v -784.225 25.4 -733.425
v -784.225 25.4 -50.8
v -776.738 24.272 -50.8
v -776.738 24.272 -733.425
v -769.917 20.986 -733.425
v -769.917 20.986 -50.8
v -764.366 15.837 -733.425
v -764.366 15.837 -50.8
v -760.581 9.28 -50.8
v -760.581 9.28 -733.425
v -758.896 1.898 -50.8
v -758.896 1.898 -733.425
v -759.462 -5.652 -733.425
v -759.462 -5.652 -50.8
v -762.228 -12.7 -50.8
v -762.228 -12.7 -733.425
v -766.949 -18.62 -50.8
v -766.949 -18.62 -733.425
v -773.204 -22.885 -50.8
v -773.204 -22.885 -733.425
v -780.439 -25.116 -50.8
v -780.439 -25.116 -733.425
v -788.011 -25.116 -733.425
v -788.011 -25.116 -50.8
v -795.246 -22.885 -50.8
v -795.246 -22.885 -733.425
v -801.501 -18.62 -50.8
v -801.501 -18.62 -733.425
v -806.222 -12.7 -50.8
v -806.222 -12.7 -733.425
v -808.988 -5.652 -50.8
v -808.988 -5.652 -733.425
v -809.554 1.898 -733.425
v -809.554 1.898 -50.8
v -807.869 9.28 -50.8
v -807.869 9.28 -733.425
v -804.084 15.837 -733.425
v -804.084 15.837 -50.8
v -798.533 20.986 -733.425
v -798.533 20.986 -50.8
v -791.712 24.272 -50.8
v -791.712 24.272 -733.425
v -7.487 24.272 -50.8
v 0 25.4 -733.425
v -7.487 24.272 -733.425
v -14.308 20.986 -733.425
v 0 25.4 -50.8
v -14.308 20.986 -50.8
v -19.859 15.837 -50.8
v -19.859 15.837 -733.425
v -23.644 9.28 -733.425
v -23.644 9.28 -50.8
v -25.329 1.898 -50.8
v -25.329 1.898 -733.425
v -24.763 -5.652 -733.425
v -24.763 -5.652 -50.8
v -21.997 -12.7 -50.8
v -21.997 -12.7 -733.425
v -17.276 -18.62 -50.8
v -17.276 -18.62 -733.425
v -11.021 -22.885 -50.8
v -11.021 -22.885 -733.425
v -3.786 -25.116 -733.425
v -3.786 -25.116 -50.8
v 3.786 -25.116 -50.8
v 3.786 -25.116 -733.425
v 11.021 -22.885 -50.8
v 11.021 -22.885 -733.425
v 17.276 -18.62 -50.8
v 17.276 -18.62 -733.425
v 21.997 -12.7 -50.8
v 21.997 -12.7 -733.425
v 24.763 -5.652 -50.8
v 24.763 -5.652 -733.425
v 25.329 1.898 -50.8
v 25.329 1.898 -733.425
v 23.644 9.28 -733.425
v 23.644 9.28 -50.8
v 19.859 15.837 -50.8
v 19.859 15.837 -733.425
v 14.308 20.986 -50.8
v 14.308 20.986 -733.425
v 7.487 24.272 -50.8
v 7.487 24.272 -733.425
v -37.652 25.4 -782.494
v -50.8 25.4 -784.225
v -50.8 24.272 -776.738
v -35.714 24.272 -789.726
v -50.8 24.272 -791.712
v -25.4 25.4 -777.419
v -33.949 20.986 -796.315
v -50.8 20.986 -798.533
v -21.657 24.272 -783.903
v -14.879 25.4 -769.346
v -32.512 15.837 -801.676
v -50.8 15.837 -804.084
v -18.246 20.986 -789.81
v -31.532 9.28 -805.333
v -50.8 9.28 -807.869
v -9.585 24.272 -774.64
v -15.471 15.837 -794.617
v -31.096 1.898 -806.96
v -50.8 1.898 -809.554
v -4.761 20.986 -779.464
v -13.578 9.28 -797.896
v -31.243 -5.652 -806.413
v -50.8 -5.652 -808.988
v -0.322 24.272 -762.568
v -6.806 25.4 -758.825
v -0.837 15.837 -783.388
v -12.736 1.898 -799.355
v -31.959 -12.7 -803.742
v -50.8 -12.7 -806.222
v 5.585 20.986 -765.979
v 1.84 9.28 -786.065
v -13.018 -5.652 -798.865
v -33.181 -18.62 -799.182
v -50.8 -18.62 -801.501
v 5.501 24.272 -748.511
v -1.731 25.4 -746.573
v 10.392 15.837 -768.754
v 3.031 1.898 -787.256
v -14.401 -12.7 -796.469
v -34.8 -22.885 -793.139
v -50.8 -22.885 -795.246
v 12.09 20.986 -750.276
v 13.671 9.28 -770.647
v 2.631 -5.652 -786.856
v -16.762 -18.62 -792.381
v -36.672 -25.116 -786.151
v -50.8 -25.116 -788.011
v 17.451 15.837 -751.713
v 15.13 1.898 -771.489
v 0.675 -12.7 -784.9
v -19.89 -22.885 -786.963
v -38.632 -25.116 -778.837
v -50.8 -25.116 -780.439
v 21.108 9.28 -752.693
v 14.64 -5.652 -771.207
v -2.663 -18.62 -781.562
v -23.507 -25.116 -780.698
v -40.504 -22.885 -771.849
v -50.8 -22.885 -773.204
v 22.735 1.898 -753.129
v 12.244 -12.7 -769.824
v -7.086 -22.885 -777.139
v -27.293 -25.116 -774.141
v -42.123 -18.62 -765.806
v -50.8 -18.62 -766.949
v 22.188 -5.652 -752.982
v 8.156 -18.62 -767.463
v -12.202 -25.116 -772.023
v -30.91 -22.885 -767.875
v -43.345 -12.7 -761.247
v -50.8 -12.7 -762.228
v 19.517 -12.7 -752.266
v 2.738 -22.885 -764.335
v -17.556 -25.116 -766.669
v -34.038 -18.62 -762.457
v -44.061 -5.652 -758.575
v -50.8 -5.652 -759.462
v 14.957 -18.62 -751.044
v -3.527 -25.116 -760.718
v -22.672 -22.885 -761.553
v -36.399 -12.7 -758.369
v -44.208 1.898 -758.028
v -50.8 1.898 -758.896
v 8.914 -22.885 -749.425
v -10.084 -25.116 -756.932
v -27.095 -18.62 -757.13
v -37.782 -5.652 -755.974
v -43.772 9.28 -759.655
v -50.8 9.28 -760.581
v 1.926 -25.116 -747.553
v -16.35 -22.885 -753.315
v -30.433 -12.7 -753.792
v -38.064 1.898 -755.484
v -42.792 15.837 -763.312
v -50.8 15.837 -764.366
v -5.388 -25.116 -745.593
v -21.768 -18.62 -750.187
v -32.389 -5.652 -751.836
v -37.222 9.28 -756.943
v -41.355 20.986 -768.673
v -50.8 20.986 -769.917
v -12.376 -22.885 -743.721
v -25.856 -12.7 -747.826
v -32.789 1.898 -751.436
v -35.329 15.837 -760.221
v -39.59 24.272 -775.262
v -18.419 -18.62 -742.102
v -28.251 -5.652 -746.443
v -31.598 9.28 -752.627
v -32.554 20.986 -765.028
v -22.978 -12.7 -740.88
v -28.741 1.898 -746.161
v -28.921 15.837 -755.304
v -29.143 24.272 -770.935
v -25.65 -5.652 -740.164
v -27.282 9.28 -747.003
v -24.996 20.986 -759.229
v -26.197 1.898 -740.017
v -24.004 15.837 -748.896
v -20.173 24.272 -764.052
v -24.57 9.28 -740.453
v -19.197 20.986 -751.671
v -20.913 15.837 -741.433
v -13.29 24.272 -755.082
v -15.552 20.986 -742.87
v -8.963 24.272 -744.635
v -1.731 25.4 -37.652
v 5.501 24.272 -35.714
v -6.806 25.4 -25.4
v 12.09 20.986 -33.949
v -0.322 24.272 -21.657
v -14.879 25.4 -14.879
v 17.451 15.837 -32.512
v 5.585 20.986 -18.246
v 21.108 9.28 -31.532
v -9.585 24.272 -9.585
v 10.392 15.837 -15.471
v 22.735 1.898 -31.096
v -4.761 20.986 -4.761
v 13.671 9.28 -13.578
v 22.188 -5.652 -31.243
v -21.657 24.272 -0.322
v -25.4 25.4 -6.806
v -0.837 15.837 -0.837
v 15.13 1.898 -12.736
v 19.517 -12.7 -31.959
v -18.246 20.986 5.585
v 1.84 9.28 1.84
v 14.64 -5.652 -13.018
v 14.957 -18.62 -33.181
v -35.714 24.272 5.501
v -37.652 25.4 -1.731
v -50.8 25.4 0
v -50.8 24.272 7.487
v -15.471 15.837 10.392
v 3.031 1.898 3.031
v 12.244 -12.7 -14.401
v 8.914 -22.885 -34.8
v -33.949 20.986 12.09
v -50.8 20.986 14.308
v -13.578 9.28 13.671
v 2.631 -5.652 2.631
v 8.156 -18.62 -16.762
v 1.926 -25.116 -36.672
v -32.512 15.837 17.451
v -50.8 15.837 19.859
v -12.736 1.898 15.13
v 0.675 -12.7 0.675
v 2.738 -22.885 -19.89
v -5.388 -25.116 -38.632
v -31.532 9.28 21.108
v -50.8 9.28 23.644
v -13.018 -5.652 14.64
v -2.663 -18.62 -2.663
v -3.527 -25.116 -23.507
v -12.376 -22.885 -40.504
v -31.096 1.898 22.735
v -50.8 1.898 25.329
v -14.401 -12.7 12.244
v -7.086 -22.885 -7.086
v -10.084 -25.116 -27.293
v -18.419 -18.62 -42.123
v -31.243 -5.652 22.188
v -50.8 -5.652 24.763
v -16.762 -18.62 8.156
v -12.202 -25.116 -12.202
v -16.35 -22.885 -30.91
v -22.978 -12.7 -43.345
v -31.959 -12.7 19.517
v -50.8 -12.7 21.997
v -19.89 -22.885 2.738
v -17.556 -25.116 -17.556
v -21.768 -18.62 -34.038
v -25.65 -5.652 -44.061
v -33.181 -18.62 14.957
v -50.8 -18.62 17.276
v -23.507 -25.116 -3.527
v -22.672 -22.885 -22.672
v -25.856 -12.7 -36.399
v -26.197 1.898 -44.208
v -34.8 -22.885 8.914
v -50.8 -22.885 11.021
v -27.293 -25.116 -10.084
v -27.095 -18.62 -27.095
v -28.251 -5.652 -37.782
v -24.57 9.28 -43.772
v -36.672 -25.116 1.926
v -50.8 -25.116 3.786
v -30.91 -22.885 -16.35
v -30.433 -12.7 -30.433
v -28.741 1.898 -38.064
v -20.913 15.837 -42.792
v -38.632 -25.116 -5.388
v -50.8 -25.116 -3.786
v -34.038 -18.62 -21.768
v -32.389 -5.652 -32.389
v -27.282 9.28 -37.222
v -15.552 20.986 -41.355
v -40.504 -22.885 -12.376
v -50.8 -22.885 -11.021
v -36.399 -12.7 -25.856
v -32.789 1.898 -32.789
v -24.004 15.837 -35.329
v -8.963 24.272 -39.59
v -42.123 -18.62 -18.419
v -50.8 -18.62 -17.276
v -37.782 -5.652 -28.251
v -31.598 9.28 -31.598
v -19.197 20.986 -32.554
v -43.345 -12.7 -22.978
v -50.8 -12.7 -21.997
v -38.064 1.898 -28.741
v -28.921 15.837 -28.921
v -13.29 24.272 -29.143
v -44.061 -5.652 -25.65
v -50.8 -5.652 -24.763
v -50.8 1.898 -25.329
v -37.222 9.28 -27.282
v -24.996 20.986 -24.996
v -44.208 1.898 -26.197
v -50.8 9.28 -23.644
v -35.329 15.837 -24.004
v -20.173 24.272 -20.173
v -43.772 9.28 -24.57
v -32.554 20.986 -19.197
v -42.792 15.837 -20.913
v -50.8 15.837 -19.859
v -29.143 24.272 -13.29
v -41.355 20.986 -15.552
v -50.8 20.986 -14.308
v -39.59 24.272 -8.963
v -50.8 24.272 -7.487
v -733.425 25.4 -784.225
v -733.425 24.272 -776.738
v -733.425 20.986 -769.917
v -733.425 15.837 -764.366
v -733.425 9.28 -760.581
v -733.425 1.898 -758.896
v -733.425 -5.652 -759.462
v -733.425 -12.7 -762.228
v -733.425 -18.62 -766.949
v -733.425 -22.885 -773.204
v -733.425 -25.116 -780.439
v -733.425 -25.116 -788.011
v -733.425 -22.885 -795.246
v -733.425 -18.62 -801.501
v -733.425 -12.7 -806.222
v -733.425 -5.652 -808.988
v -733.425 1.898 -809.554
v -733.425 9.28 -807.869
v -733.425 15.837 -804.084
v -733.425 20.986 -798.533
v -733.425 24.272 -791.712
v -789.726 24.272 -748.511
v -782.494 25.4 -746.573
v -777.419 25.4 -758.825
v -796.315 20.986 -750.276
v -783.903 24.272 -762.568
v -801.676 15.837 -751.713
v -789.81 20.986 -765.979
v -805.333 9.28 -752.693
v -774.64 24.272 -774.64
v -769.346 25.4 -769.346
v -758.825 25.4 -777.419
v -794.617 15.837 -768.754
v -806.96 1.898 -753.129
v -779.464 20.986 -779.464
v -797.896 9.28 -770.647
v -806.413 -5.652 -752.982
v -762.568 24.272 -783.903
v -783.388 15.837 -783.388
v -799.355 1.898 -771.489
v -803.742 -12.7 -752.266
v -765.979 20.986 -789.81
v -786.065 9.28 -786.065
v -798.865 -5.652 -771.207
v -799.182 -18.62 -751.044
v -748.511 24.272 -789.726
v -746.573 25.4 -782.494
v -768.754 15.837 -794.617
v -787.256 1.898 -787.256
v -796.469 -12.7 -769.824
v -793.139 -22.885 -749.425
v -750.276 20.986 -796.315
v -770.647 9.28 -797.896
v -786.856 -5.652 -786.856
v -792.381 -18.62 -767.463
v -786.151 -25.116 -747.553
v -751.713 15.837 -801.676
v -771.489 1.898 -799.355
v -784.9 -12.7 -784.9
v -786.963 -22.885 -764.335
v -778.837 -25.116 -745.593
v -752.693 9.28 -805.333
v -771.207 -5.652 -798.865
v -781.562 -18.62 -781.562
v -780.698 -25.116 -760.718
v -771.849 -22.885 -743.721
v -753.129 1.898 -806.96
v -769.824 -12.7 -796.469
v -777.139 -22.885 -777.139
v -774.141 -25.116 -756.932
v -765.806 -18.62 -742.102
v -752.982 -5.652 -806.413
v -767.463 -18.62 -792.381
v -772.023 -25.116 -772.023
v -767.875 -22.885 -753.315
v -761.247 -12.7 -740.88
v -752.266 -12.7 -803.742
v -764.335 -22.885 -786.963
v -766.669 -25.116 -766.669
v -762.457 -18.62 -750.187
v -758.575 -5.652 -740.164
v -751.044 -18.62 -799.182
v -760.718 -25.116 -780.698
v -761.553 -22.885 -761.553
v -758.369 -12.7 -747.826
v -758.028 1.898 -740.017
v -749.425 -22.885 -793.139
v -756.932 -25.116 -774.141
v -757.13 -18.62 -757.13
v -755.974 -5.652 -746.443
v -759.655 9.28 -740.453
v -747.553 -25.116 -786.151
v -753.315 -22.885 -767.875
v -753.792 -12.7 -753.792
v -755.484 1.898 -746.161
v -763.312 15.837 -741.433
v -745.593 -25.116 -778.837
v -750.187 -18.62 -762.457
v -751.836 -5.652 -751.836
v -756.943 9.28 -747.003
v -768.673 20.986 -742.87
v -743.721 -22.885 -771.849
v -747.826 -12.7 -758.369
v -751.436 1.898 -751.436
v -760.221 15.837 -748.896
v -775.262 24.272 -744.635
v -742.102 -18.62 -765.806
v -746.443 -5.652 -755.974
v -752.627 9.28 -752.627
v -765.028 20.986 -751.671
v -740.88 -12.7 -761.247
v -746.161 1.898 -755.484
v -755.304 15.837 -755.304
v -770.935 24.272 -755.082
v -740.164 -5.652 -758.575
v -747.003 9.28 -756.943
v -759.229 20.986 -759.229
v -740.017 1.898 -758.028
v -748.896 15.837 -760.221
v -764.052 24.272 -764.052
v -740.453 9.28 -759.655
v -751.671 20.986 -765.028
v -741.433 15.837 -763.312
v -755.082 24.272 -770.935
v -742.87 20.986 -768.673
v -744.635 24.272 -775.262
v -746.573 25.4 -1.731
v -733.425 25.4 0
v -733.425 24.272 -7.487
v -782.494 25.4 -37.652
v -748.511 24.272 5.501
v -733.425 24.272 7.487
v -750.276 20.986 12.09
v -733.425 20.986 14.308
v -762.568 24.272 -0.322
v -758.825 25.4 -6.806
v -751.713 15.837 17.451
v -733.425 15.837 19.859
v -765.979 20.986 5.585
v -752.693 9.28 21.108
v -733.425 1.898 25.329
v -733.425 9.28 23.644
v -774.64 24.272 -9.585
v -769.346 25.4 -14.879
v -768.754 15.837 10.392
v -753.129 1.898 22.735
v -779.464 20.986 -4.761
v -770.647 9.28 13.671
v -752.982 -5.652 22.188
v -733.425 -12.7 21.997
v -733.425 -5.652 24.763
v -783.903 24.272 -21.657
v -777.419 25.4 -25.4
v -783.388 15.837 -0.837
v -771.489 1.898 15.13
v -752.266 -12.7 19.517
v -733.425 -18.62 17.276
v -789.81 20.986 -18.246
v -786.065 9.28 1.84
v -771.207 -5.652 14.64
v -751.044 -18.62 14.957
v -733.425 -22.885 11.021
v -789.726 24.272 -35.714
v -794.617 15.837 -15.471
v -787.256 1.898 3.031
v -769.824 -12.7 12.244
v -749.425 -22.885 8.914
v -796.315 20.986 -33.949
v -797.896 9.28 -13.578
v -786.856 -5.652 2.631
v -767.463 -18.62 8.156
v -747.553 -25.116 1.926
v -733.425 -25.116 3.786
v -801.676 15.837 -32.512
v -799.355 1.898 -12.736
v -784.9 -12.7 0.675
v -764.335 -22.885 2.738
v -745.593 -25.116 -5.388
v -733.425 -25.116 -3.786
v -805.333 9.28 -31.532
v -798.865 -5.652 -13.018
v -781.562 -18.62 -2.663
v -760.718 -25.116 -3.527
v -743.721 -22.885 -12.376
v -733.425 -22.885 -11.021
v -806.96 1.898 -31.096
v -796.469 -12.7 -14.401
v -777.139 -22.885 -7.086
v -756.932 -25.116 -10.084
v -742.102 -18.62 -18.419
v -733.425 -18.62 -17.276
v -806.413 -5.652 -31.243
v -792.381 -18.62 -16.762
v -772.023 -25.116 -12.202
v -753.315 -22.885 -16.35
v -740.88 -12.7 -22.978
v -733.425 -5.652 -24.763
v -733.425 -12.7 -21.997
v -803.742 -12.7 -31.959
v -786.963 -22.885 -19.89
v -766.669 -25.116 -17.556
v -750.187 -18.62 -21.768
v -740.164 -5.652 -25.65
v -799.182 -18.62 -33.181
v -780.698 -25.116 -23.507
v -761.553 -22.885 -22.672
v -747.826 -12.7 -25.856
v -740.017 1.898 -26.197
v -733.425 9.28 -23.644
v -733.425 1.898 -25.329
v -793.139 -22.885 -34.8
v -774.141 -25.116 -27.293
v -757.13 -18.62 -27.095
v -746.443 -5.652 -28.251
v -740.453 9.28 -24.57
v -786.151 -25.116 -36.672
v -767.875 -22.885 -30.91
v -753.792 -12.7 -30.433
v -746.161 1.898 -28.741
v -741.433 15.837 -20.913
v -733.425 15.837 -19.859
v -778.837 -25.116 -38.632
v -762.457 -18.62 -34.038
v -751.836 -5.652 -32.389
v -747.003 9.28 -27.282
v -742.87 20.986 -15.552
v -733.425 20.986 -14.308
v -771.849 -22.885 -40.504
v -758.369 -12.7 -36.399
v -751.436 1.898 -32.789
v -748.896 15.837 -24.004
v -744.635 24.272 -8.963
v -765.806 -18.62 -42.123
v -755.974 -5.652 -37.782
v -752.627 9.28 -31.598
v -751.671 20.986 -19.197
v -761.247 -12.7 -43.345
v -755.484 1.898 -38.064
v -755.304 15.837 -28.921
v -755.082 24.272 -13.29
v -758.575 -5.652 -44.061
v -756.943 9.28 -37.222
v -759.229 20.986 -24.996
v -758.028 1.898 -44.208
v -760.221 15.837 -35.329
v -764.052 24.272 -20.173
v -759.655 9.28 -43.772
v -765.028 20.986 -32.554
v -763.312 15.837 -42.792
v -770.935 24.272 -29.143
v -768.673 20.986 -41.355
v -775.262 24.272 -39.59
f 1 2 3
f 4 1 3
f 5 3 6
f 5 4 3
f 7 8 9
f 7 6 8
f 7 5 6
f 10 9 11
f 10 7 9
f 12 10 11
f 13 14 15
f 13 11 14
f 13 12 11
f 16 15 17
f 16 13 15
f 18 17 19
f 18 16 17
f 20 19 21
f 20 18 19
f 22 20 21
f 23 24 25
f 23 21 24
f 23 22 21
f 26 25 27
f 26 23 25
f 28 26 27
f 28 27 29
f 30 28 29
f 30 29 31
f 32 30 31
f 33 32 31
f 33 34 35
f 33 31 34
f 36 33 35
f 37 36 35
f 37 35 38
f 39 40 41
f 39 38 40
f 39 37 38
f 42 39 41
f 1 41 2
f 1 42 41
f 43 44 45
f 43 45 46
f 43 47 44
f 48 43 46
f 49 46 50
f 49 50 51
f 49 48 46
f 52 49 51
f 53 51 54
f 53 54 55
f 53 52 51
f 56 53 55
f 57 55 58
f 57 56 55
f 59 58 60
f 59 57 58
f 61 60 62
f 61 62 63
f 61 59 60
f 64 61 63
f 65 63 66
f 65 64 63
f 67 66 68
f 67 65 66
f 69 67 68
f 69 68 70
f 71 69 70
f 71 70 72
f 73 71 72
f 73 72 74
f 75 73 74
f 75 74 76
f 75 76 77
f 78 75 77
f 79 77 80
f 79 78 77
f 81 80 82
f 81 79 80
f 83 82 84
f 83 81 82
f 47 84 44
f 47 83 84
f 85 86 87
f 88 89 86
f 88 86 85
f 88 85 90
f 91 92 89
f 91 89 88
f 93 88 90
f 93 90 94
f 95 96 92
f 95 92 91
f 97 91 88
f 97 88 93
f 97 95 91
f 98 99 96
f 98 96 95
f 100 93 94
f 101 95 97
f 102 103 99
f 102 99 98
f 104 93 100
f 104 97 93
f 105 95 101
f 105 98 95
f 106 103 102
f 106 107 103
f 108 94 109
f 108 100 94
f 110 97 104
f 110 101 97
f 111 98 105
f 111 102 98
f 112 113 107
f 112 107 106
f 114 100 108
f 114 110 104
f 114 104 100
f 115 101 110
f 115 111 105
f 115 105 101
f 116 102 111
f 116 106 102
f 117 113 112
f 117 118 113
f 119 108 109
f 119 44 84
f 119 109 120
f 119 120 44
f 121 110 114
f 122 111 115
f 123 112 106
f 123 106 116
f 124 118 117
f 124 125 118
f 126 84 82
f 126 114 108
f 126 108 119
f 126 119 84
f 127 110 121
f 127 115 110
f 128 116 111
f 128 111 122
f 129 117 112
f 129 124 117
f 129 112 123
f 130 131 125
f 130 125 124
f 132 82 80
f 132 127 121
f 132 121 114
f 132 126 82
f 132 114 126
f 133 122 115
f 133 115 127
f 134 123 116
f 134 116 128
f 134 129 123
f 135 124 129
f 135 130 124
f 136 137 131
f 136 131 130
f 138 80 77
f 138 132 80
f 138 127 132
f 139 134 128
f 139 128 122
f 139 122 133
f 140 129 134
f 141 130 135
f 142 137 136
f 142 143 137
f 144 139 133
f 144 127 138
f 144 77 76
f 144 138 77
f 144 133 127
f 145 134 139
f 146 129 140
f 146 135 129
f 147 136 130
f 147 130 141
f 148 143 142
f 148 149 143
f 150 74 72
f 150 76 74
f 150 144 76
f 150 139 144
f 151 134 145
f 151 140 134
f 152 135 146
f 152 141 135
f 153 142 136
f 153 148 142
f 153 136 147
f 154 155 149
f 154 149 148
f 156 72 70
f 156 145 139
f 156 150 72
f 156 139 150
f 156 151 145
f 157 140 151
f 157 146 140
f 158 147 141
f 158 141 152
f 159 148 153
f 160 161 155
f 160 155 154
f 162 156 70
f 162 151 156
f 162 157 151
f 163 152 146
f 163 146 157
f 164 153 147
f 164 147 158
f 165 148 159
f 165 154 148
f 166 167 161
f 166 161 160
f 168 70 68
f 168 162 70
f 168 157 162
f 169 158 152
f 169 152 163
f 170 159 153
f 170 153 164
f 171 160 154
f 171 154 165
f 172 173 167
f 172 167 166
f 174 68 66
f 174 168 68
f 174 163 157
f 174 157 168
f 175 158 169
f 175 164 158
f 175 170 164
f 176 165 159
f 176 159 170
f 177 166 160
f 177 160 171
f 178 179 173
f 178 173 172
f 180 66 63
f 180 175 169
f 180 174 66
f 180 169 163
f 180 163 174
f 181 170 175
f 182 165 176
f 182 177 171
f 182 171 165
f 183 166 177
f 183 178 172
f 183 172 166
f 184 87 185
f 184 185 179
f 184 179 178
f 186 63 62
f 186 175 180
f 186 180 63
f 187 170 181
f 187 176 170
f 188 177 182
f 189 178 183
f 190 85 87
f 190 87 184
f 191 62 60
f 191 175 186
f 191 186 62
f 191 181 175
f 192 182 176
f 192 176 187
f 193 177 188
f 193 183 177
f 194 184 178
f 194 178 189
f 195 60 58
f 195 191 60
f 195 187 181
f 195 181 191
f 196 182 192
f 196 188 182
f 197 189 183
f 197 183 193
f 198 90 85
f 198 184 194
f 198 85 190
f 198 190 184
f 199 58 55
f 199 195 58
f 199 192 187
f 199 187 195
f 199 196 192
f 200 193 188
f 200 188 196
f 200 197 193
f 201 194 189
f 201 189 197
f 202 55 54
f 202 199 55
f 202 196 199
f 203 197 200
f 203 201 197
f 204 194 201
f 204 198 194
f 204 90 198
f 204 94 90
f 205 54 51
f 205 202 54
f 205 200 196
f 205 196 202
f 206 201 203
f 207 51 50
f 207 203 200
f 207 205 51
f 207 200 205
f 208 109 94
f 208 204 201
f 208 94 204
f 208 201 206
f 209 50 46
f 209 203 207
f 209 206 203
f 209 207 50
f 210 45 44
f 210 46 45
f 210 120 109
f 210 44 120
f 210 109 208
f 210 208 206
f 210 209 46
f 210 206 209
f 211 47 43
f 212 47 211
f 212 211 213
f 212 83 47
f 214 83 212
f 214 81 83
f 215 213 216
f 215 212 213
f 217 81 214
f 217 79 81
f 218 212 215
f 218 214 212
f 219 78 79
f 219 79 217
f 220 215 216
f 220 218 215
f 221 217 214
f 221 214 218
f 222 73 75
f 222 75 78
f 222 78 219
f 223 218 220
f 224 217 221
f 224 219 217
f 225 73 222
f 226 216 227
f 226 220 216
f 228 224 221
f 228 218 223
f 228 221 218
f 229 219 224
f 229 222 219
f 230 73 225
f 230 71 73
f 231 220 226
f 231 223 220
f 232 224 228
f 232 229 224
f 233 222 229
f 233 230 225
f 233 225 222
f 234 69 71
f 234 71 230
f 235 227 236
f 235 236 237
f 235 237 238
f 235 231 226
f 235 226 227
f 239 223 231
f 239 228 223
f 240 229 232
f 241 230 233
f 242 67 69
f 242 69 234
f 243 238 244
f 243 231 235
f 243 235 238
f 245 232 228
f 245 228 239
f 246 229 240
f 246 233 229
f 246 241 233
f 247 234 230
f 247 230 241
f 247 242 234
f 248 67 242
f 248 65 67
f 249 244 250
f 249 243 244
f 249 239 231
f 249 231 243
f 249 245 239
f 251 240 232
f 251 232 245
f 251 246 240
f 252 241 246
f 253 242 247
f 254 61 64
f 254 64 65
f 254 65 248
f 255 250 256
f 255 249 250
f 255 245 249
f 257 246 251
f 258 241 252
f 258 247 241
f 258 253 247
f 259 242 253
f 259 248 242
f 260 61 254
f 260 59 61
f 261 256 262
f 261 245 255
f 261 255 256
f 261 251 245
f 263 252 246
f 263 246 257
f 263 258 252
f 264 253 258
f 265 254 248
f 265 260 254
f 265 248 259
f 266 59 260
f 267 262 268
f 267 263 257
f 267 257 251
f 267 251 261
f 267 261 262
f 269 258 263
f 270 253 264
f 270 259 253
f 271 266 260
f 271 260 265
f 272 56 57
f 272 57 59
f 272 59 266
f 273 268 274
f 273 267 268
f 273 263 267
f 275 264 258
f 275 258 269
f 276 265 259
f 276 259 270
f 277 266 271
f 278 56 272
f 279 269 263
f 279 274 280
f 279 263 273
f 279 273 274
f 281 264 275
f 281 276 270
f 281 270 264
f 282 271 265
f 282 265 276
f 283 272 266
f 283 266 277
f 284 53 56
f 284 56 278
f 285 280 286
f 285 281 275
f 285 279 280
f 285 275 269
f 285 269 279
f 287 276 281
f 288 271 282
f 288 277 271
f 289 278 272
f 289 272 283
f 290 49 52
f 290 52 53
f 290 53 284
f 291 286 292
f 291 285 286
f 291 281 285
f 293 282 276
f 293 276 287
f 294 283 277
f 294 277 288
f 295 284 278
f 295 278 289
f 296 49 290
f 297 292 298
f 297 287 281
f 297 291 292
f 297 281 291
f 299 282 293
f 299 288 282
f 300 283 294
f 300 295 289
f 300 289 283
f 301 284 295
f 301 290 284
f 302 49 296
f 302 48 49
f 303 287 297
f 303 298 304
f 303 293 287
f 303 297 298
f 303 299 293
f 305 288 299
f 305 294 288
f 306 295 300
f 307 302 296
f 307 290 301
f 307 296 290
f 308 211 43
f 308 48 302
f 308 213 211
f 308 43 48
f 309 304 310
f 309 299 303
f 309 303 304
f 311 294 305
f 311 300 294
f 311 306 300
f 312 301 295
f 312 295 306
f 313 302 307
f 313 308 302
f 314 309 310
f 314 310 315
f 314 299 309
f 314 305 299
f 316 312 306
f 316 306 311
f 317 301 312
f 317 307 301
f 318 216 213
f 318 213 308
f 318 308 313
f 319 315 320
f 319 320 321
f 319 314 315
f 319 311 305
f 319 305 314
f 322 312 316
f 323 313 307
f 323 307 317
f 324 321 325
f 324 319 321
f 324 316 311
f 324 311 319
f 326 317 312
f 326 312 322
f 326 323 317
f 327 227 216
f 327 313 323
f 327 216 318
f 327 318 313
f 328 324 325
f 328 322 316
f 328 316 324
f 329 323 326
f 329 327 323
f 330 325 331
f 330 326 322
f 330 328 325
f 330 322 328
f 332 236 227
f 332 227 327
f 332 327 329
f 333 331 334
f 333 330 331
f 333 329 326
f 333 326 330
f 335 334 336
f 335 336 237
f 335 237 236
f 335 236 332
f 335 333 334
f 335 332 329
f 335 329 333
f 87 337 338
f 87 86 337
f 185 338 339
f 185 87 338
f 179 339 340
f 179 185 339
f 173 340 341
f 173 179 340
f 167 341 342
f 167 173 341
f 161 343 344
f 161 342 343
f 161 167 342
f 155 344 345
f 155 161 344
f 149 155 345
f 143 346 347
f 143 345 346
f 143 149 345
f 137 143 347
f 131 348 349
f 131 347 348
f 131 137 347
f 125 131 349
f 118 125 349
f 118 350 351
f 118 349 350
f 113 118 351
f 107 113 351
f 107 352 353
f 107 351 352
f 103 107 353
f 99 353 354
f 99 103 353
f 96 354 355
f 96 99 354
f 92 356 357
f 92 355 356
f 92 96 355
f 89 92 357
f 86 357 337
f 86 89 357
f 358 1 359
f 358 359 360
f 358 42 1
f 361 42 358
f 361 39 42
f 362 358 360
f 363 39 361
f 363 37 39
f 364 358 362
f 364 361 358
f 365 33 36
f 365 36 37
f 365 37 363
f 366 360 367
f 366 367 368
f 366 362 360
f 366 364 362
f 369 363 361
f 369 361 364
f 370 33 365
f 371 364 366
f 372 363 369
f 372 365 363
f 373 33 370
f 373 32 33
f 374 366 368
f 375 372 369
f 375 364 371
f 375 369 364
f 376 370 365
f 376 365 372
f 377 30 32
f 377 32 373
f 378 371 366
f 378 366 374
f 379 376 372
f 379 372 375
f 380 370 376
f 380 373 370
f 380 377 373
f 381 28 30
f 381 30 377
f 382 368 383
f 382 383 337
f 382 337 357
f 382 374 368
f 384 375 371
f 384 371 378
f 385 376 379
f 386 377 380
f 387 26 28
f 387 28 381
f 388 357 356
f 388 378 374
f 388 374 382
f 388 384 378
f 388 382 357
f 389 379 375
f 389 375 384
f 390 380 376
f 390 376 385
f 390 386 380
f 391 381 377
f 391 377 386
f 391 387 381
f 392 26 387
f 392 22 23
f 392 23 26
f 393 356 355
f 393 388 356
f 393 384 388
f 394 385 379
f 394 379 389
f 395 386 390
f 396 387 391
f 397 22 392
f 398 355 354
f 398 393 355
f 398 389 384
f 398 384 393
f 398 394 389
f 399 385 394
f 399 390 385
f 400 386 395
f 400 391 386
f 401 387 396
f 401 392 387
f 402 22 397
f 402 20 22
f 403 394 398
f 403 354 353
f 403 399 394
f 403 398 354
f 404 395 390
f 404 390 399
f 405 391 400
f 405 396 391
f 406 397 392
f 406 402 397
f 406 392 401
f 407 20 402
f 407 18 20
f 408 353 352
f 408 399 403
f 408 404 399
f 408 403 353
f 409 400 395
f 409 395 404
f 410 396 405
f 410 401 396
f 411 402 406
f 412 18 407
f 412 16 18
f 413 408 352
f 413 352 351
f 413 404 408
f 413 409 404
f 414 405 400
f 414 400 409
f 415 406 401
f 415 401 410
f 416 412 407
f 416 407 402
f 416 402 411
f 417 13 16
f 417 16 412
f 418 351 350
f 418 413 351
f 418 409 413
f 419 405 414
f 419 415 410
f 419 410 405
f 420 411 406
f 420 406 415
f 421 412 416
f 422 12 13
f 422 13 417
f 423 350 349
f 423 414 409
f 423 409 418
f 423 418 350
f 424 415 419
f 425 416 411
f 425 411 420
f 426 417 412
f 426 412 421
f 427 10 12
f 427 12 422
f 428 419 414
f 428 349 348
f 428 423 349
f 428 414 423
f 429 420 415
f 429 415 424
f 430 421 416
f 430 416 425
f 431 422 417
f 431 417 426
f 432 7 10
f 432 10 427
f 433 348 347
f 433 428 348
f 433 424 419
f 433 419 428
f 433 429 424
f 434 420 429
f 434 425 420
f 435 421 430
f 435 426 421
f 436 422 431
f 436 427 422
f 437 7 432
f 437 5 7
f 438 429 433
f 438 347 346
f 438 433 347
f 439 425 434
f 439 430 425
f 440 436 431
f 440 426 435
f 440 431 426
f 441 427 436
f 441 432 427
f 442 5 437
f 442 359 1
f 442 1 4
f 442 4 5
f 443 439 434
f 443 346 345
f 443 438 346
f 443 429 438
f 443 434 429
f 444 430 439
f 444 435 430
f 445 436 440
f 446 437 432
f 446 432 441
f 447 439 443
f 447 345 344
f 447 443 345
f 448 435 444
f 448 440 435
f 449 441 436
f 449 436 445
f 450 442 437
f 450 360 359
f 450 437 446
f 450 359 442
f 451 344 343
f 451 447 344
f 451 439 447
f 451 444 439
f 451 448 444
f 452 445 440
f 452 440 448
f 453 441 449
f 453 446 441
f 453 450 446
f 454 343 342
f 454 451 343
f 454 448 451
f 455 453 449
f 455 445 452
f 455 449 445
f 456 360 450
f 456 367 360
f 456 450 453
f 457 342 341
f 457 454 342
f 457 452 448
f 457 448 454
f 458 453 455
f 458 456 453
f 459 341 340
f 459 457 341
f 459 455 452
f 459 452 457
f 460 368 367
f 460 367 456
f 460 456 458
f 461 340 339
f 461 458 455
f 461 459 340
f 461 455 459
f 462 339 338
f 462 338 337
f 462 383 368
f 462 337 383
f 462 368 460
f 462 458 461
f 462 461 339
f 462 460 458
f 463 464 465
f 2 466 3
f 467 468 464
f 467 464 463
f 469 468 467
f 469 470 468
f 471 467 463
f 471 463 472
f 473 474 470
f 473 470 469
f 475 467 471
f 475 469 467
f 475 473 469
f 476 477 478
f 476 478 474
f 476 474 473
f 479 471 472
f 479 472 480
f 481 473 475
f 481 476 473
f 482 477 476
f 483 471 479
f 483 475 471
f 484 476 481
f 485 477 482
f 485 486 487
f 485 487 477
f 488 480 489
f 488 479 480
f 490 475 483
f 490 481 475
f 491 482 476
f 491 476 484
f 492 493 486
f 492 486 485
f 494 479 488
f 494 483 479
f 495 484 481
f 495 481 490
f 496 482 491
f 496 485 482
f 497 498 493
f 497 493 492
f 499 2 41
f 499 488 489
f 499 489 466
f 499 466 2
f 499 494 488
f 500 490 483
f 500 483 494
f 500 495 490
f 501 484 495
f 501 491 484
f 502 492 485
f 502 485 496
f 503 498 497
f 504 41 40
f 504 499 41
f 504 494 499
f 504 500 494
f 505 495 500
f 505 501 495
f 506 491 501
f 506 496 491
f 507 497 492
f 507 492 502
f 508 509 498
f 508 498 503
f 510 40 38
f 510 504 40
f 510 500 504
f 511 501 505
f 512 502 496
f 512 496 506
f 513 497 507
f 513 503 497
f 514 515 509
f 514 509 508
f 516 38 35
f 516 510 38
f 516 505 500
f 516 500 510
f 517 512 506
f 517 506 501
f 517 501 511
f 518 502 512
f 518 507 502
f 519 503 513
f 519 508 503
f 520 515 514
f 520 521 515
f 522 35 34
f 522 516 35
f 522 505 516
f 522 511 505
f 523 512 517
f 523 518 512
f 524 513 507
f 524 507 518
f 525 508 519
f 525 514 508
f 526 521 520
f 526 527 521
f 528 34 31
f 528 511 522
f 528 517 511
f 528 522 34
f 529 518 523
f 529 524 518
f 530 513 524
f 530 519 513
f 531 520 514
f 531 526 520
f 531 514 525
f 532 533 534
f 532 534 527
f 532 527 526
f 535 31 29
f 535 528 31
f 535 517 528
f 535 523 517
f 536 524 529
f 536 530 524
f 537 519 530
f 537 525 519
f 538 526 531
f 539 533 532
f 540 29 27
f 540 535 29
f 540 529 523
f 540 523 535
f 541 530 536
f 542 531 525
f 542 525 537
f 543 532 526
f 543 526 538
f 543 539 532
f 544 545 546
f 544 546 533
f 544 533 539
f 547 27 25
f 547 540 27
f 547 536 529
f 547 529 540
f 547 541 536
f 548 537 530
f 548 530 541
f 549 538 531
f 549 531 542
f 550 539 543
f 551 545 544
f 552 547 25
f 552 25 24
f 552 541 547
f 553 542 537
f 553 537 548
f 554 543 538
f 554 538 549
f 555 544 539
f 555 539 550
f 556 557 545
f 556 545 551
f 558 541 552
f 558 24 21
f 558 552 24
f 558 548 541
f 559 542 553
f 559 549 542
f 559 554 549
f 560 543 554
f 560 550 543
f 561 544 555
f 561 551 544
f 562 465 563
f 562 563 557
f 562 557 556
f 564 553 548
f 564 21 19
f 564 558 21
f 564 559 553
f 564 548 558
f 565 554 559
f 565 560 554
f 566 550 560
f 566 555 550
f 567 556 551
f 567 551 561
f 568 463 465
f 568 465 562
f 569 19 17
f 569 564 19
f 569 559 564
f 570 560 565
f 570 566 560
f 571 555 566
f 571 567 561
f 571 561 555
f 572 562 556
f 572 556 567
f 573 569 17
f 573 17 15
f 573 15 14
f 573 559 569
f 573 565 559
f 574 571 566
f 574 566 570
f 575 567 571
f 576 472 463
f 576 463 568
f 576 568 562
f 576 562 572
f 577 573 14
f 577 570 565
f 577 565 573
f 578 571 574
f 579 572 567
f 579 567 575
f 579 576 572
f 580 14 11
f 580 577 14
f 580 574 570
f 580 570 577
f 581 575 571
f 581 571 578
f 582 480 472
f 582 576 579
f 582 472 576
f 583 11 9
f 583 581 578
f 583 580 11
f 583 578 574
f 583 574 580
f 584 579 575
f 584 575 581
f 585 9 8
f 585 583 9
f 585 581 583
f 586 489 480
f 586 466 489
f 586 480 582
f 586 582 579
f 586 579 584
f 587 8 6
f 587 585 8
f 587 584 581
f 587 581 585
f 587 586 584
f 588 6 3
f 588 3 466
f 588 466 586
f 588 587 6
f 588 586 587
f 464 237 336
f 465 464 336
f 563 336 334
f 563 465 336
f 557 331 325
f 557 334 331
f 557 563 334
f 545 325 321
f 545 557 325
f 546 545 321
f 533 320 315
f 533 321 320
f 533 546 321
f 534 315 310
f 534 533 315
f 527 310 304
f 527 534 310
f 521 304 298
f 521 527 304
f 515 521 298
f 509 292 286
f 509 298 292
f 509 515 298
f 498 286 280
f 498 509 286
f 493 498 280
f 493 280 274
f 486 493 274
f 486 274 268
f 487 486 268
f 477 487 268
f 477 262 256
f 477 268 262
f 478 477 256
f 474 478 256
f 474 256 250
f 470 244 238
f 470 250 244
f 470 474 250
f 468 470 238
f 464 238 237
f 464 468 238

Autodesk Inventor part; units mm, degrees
ref_plane "XZ Plane" through (0, 0, 0) normal (0, 1, 0) x (-1, 0, 0)
ref_plane "XY Plane" through (0, 0, 0) normal (0, 0, 1) x (1, 0, 0)
sketch "Sketch1" plane through (0, 0, 0) normal (0, 1, 0) x (-1, 0, 0)
  line L0 (50.8, 0) -> (733.425, 0)
  line L1 (784.225, -50.8) -> (784.225, -733.425)
  line L2 (733.425, -784.225) -> (50.8, -784.225)
  line L3 (0, -733.425) -> (0, -50.8)
  arc A0 (784.225, -50.8) -> (733.425, 0) centre (733.425, -50.8) ccw
  arc A1 (733.425, -784.225) -> (784.225, -733.425) centre (733.425, -733.425) ccw
  arc A2 (0, -733.425) -> (50.8, -784.225) centre (50.8, -733.425) ccw
  arc A3 (50.8, 0) -> (0, -50.8) centre (50.8, -50.8) ccw
  point P0 (0, 0)
  point P1 (784.225, -784.225)
  point P2 (784.225, 0)
  point P3 (0, -784.225)
  dimension "d0" = 784.225
  dimension "d1" = 784.225
  dimension "d2" = 50.8
ref_plane "Work Plane1" through (-379.4125, 0, 0) normal (1, 0, 0) x (0, 1, 0)
sketch "Sketch2" plane through (-379.4125, 0, 0) normal (1, 0, 0) x (0, 1, 0)
  circle A0 centre (0, 0) radius 25.4
  dimension "d4" = 50.8
sweep "Sweep1" add profiles "Sketch2" path "Sketch1"
properties part number "Pool Noodles"
